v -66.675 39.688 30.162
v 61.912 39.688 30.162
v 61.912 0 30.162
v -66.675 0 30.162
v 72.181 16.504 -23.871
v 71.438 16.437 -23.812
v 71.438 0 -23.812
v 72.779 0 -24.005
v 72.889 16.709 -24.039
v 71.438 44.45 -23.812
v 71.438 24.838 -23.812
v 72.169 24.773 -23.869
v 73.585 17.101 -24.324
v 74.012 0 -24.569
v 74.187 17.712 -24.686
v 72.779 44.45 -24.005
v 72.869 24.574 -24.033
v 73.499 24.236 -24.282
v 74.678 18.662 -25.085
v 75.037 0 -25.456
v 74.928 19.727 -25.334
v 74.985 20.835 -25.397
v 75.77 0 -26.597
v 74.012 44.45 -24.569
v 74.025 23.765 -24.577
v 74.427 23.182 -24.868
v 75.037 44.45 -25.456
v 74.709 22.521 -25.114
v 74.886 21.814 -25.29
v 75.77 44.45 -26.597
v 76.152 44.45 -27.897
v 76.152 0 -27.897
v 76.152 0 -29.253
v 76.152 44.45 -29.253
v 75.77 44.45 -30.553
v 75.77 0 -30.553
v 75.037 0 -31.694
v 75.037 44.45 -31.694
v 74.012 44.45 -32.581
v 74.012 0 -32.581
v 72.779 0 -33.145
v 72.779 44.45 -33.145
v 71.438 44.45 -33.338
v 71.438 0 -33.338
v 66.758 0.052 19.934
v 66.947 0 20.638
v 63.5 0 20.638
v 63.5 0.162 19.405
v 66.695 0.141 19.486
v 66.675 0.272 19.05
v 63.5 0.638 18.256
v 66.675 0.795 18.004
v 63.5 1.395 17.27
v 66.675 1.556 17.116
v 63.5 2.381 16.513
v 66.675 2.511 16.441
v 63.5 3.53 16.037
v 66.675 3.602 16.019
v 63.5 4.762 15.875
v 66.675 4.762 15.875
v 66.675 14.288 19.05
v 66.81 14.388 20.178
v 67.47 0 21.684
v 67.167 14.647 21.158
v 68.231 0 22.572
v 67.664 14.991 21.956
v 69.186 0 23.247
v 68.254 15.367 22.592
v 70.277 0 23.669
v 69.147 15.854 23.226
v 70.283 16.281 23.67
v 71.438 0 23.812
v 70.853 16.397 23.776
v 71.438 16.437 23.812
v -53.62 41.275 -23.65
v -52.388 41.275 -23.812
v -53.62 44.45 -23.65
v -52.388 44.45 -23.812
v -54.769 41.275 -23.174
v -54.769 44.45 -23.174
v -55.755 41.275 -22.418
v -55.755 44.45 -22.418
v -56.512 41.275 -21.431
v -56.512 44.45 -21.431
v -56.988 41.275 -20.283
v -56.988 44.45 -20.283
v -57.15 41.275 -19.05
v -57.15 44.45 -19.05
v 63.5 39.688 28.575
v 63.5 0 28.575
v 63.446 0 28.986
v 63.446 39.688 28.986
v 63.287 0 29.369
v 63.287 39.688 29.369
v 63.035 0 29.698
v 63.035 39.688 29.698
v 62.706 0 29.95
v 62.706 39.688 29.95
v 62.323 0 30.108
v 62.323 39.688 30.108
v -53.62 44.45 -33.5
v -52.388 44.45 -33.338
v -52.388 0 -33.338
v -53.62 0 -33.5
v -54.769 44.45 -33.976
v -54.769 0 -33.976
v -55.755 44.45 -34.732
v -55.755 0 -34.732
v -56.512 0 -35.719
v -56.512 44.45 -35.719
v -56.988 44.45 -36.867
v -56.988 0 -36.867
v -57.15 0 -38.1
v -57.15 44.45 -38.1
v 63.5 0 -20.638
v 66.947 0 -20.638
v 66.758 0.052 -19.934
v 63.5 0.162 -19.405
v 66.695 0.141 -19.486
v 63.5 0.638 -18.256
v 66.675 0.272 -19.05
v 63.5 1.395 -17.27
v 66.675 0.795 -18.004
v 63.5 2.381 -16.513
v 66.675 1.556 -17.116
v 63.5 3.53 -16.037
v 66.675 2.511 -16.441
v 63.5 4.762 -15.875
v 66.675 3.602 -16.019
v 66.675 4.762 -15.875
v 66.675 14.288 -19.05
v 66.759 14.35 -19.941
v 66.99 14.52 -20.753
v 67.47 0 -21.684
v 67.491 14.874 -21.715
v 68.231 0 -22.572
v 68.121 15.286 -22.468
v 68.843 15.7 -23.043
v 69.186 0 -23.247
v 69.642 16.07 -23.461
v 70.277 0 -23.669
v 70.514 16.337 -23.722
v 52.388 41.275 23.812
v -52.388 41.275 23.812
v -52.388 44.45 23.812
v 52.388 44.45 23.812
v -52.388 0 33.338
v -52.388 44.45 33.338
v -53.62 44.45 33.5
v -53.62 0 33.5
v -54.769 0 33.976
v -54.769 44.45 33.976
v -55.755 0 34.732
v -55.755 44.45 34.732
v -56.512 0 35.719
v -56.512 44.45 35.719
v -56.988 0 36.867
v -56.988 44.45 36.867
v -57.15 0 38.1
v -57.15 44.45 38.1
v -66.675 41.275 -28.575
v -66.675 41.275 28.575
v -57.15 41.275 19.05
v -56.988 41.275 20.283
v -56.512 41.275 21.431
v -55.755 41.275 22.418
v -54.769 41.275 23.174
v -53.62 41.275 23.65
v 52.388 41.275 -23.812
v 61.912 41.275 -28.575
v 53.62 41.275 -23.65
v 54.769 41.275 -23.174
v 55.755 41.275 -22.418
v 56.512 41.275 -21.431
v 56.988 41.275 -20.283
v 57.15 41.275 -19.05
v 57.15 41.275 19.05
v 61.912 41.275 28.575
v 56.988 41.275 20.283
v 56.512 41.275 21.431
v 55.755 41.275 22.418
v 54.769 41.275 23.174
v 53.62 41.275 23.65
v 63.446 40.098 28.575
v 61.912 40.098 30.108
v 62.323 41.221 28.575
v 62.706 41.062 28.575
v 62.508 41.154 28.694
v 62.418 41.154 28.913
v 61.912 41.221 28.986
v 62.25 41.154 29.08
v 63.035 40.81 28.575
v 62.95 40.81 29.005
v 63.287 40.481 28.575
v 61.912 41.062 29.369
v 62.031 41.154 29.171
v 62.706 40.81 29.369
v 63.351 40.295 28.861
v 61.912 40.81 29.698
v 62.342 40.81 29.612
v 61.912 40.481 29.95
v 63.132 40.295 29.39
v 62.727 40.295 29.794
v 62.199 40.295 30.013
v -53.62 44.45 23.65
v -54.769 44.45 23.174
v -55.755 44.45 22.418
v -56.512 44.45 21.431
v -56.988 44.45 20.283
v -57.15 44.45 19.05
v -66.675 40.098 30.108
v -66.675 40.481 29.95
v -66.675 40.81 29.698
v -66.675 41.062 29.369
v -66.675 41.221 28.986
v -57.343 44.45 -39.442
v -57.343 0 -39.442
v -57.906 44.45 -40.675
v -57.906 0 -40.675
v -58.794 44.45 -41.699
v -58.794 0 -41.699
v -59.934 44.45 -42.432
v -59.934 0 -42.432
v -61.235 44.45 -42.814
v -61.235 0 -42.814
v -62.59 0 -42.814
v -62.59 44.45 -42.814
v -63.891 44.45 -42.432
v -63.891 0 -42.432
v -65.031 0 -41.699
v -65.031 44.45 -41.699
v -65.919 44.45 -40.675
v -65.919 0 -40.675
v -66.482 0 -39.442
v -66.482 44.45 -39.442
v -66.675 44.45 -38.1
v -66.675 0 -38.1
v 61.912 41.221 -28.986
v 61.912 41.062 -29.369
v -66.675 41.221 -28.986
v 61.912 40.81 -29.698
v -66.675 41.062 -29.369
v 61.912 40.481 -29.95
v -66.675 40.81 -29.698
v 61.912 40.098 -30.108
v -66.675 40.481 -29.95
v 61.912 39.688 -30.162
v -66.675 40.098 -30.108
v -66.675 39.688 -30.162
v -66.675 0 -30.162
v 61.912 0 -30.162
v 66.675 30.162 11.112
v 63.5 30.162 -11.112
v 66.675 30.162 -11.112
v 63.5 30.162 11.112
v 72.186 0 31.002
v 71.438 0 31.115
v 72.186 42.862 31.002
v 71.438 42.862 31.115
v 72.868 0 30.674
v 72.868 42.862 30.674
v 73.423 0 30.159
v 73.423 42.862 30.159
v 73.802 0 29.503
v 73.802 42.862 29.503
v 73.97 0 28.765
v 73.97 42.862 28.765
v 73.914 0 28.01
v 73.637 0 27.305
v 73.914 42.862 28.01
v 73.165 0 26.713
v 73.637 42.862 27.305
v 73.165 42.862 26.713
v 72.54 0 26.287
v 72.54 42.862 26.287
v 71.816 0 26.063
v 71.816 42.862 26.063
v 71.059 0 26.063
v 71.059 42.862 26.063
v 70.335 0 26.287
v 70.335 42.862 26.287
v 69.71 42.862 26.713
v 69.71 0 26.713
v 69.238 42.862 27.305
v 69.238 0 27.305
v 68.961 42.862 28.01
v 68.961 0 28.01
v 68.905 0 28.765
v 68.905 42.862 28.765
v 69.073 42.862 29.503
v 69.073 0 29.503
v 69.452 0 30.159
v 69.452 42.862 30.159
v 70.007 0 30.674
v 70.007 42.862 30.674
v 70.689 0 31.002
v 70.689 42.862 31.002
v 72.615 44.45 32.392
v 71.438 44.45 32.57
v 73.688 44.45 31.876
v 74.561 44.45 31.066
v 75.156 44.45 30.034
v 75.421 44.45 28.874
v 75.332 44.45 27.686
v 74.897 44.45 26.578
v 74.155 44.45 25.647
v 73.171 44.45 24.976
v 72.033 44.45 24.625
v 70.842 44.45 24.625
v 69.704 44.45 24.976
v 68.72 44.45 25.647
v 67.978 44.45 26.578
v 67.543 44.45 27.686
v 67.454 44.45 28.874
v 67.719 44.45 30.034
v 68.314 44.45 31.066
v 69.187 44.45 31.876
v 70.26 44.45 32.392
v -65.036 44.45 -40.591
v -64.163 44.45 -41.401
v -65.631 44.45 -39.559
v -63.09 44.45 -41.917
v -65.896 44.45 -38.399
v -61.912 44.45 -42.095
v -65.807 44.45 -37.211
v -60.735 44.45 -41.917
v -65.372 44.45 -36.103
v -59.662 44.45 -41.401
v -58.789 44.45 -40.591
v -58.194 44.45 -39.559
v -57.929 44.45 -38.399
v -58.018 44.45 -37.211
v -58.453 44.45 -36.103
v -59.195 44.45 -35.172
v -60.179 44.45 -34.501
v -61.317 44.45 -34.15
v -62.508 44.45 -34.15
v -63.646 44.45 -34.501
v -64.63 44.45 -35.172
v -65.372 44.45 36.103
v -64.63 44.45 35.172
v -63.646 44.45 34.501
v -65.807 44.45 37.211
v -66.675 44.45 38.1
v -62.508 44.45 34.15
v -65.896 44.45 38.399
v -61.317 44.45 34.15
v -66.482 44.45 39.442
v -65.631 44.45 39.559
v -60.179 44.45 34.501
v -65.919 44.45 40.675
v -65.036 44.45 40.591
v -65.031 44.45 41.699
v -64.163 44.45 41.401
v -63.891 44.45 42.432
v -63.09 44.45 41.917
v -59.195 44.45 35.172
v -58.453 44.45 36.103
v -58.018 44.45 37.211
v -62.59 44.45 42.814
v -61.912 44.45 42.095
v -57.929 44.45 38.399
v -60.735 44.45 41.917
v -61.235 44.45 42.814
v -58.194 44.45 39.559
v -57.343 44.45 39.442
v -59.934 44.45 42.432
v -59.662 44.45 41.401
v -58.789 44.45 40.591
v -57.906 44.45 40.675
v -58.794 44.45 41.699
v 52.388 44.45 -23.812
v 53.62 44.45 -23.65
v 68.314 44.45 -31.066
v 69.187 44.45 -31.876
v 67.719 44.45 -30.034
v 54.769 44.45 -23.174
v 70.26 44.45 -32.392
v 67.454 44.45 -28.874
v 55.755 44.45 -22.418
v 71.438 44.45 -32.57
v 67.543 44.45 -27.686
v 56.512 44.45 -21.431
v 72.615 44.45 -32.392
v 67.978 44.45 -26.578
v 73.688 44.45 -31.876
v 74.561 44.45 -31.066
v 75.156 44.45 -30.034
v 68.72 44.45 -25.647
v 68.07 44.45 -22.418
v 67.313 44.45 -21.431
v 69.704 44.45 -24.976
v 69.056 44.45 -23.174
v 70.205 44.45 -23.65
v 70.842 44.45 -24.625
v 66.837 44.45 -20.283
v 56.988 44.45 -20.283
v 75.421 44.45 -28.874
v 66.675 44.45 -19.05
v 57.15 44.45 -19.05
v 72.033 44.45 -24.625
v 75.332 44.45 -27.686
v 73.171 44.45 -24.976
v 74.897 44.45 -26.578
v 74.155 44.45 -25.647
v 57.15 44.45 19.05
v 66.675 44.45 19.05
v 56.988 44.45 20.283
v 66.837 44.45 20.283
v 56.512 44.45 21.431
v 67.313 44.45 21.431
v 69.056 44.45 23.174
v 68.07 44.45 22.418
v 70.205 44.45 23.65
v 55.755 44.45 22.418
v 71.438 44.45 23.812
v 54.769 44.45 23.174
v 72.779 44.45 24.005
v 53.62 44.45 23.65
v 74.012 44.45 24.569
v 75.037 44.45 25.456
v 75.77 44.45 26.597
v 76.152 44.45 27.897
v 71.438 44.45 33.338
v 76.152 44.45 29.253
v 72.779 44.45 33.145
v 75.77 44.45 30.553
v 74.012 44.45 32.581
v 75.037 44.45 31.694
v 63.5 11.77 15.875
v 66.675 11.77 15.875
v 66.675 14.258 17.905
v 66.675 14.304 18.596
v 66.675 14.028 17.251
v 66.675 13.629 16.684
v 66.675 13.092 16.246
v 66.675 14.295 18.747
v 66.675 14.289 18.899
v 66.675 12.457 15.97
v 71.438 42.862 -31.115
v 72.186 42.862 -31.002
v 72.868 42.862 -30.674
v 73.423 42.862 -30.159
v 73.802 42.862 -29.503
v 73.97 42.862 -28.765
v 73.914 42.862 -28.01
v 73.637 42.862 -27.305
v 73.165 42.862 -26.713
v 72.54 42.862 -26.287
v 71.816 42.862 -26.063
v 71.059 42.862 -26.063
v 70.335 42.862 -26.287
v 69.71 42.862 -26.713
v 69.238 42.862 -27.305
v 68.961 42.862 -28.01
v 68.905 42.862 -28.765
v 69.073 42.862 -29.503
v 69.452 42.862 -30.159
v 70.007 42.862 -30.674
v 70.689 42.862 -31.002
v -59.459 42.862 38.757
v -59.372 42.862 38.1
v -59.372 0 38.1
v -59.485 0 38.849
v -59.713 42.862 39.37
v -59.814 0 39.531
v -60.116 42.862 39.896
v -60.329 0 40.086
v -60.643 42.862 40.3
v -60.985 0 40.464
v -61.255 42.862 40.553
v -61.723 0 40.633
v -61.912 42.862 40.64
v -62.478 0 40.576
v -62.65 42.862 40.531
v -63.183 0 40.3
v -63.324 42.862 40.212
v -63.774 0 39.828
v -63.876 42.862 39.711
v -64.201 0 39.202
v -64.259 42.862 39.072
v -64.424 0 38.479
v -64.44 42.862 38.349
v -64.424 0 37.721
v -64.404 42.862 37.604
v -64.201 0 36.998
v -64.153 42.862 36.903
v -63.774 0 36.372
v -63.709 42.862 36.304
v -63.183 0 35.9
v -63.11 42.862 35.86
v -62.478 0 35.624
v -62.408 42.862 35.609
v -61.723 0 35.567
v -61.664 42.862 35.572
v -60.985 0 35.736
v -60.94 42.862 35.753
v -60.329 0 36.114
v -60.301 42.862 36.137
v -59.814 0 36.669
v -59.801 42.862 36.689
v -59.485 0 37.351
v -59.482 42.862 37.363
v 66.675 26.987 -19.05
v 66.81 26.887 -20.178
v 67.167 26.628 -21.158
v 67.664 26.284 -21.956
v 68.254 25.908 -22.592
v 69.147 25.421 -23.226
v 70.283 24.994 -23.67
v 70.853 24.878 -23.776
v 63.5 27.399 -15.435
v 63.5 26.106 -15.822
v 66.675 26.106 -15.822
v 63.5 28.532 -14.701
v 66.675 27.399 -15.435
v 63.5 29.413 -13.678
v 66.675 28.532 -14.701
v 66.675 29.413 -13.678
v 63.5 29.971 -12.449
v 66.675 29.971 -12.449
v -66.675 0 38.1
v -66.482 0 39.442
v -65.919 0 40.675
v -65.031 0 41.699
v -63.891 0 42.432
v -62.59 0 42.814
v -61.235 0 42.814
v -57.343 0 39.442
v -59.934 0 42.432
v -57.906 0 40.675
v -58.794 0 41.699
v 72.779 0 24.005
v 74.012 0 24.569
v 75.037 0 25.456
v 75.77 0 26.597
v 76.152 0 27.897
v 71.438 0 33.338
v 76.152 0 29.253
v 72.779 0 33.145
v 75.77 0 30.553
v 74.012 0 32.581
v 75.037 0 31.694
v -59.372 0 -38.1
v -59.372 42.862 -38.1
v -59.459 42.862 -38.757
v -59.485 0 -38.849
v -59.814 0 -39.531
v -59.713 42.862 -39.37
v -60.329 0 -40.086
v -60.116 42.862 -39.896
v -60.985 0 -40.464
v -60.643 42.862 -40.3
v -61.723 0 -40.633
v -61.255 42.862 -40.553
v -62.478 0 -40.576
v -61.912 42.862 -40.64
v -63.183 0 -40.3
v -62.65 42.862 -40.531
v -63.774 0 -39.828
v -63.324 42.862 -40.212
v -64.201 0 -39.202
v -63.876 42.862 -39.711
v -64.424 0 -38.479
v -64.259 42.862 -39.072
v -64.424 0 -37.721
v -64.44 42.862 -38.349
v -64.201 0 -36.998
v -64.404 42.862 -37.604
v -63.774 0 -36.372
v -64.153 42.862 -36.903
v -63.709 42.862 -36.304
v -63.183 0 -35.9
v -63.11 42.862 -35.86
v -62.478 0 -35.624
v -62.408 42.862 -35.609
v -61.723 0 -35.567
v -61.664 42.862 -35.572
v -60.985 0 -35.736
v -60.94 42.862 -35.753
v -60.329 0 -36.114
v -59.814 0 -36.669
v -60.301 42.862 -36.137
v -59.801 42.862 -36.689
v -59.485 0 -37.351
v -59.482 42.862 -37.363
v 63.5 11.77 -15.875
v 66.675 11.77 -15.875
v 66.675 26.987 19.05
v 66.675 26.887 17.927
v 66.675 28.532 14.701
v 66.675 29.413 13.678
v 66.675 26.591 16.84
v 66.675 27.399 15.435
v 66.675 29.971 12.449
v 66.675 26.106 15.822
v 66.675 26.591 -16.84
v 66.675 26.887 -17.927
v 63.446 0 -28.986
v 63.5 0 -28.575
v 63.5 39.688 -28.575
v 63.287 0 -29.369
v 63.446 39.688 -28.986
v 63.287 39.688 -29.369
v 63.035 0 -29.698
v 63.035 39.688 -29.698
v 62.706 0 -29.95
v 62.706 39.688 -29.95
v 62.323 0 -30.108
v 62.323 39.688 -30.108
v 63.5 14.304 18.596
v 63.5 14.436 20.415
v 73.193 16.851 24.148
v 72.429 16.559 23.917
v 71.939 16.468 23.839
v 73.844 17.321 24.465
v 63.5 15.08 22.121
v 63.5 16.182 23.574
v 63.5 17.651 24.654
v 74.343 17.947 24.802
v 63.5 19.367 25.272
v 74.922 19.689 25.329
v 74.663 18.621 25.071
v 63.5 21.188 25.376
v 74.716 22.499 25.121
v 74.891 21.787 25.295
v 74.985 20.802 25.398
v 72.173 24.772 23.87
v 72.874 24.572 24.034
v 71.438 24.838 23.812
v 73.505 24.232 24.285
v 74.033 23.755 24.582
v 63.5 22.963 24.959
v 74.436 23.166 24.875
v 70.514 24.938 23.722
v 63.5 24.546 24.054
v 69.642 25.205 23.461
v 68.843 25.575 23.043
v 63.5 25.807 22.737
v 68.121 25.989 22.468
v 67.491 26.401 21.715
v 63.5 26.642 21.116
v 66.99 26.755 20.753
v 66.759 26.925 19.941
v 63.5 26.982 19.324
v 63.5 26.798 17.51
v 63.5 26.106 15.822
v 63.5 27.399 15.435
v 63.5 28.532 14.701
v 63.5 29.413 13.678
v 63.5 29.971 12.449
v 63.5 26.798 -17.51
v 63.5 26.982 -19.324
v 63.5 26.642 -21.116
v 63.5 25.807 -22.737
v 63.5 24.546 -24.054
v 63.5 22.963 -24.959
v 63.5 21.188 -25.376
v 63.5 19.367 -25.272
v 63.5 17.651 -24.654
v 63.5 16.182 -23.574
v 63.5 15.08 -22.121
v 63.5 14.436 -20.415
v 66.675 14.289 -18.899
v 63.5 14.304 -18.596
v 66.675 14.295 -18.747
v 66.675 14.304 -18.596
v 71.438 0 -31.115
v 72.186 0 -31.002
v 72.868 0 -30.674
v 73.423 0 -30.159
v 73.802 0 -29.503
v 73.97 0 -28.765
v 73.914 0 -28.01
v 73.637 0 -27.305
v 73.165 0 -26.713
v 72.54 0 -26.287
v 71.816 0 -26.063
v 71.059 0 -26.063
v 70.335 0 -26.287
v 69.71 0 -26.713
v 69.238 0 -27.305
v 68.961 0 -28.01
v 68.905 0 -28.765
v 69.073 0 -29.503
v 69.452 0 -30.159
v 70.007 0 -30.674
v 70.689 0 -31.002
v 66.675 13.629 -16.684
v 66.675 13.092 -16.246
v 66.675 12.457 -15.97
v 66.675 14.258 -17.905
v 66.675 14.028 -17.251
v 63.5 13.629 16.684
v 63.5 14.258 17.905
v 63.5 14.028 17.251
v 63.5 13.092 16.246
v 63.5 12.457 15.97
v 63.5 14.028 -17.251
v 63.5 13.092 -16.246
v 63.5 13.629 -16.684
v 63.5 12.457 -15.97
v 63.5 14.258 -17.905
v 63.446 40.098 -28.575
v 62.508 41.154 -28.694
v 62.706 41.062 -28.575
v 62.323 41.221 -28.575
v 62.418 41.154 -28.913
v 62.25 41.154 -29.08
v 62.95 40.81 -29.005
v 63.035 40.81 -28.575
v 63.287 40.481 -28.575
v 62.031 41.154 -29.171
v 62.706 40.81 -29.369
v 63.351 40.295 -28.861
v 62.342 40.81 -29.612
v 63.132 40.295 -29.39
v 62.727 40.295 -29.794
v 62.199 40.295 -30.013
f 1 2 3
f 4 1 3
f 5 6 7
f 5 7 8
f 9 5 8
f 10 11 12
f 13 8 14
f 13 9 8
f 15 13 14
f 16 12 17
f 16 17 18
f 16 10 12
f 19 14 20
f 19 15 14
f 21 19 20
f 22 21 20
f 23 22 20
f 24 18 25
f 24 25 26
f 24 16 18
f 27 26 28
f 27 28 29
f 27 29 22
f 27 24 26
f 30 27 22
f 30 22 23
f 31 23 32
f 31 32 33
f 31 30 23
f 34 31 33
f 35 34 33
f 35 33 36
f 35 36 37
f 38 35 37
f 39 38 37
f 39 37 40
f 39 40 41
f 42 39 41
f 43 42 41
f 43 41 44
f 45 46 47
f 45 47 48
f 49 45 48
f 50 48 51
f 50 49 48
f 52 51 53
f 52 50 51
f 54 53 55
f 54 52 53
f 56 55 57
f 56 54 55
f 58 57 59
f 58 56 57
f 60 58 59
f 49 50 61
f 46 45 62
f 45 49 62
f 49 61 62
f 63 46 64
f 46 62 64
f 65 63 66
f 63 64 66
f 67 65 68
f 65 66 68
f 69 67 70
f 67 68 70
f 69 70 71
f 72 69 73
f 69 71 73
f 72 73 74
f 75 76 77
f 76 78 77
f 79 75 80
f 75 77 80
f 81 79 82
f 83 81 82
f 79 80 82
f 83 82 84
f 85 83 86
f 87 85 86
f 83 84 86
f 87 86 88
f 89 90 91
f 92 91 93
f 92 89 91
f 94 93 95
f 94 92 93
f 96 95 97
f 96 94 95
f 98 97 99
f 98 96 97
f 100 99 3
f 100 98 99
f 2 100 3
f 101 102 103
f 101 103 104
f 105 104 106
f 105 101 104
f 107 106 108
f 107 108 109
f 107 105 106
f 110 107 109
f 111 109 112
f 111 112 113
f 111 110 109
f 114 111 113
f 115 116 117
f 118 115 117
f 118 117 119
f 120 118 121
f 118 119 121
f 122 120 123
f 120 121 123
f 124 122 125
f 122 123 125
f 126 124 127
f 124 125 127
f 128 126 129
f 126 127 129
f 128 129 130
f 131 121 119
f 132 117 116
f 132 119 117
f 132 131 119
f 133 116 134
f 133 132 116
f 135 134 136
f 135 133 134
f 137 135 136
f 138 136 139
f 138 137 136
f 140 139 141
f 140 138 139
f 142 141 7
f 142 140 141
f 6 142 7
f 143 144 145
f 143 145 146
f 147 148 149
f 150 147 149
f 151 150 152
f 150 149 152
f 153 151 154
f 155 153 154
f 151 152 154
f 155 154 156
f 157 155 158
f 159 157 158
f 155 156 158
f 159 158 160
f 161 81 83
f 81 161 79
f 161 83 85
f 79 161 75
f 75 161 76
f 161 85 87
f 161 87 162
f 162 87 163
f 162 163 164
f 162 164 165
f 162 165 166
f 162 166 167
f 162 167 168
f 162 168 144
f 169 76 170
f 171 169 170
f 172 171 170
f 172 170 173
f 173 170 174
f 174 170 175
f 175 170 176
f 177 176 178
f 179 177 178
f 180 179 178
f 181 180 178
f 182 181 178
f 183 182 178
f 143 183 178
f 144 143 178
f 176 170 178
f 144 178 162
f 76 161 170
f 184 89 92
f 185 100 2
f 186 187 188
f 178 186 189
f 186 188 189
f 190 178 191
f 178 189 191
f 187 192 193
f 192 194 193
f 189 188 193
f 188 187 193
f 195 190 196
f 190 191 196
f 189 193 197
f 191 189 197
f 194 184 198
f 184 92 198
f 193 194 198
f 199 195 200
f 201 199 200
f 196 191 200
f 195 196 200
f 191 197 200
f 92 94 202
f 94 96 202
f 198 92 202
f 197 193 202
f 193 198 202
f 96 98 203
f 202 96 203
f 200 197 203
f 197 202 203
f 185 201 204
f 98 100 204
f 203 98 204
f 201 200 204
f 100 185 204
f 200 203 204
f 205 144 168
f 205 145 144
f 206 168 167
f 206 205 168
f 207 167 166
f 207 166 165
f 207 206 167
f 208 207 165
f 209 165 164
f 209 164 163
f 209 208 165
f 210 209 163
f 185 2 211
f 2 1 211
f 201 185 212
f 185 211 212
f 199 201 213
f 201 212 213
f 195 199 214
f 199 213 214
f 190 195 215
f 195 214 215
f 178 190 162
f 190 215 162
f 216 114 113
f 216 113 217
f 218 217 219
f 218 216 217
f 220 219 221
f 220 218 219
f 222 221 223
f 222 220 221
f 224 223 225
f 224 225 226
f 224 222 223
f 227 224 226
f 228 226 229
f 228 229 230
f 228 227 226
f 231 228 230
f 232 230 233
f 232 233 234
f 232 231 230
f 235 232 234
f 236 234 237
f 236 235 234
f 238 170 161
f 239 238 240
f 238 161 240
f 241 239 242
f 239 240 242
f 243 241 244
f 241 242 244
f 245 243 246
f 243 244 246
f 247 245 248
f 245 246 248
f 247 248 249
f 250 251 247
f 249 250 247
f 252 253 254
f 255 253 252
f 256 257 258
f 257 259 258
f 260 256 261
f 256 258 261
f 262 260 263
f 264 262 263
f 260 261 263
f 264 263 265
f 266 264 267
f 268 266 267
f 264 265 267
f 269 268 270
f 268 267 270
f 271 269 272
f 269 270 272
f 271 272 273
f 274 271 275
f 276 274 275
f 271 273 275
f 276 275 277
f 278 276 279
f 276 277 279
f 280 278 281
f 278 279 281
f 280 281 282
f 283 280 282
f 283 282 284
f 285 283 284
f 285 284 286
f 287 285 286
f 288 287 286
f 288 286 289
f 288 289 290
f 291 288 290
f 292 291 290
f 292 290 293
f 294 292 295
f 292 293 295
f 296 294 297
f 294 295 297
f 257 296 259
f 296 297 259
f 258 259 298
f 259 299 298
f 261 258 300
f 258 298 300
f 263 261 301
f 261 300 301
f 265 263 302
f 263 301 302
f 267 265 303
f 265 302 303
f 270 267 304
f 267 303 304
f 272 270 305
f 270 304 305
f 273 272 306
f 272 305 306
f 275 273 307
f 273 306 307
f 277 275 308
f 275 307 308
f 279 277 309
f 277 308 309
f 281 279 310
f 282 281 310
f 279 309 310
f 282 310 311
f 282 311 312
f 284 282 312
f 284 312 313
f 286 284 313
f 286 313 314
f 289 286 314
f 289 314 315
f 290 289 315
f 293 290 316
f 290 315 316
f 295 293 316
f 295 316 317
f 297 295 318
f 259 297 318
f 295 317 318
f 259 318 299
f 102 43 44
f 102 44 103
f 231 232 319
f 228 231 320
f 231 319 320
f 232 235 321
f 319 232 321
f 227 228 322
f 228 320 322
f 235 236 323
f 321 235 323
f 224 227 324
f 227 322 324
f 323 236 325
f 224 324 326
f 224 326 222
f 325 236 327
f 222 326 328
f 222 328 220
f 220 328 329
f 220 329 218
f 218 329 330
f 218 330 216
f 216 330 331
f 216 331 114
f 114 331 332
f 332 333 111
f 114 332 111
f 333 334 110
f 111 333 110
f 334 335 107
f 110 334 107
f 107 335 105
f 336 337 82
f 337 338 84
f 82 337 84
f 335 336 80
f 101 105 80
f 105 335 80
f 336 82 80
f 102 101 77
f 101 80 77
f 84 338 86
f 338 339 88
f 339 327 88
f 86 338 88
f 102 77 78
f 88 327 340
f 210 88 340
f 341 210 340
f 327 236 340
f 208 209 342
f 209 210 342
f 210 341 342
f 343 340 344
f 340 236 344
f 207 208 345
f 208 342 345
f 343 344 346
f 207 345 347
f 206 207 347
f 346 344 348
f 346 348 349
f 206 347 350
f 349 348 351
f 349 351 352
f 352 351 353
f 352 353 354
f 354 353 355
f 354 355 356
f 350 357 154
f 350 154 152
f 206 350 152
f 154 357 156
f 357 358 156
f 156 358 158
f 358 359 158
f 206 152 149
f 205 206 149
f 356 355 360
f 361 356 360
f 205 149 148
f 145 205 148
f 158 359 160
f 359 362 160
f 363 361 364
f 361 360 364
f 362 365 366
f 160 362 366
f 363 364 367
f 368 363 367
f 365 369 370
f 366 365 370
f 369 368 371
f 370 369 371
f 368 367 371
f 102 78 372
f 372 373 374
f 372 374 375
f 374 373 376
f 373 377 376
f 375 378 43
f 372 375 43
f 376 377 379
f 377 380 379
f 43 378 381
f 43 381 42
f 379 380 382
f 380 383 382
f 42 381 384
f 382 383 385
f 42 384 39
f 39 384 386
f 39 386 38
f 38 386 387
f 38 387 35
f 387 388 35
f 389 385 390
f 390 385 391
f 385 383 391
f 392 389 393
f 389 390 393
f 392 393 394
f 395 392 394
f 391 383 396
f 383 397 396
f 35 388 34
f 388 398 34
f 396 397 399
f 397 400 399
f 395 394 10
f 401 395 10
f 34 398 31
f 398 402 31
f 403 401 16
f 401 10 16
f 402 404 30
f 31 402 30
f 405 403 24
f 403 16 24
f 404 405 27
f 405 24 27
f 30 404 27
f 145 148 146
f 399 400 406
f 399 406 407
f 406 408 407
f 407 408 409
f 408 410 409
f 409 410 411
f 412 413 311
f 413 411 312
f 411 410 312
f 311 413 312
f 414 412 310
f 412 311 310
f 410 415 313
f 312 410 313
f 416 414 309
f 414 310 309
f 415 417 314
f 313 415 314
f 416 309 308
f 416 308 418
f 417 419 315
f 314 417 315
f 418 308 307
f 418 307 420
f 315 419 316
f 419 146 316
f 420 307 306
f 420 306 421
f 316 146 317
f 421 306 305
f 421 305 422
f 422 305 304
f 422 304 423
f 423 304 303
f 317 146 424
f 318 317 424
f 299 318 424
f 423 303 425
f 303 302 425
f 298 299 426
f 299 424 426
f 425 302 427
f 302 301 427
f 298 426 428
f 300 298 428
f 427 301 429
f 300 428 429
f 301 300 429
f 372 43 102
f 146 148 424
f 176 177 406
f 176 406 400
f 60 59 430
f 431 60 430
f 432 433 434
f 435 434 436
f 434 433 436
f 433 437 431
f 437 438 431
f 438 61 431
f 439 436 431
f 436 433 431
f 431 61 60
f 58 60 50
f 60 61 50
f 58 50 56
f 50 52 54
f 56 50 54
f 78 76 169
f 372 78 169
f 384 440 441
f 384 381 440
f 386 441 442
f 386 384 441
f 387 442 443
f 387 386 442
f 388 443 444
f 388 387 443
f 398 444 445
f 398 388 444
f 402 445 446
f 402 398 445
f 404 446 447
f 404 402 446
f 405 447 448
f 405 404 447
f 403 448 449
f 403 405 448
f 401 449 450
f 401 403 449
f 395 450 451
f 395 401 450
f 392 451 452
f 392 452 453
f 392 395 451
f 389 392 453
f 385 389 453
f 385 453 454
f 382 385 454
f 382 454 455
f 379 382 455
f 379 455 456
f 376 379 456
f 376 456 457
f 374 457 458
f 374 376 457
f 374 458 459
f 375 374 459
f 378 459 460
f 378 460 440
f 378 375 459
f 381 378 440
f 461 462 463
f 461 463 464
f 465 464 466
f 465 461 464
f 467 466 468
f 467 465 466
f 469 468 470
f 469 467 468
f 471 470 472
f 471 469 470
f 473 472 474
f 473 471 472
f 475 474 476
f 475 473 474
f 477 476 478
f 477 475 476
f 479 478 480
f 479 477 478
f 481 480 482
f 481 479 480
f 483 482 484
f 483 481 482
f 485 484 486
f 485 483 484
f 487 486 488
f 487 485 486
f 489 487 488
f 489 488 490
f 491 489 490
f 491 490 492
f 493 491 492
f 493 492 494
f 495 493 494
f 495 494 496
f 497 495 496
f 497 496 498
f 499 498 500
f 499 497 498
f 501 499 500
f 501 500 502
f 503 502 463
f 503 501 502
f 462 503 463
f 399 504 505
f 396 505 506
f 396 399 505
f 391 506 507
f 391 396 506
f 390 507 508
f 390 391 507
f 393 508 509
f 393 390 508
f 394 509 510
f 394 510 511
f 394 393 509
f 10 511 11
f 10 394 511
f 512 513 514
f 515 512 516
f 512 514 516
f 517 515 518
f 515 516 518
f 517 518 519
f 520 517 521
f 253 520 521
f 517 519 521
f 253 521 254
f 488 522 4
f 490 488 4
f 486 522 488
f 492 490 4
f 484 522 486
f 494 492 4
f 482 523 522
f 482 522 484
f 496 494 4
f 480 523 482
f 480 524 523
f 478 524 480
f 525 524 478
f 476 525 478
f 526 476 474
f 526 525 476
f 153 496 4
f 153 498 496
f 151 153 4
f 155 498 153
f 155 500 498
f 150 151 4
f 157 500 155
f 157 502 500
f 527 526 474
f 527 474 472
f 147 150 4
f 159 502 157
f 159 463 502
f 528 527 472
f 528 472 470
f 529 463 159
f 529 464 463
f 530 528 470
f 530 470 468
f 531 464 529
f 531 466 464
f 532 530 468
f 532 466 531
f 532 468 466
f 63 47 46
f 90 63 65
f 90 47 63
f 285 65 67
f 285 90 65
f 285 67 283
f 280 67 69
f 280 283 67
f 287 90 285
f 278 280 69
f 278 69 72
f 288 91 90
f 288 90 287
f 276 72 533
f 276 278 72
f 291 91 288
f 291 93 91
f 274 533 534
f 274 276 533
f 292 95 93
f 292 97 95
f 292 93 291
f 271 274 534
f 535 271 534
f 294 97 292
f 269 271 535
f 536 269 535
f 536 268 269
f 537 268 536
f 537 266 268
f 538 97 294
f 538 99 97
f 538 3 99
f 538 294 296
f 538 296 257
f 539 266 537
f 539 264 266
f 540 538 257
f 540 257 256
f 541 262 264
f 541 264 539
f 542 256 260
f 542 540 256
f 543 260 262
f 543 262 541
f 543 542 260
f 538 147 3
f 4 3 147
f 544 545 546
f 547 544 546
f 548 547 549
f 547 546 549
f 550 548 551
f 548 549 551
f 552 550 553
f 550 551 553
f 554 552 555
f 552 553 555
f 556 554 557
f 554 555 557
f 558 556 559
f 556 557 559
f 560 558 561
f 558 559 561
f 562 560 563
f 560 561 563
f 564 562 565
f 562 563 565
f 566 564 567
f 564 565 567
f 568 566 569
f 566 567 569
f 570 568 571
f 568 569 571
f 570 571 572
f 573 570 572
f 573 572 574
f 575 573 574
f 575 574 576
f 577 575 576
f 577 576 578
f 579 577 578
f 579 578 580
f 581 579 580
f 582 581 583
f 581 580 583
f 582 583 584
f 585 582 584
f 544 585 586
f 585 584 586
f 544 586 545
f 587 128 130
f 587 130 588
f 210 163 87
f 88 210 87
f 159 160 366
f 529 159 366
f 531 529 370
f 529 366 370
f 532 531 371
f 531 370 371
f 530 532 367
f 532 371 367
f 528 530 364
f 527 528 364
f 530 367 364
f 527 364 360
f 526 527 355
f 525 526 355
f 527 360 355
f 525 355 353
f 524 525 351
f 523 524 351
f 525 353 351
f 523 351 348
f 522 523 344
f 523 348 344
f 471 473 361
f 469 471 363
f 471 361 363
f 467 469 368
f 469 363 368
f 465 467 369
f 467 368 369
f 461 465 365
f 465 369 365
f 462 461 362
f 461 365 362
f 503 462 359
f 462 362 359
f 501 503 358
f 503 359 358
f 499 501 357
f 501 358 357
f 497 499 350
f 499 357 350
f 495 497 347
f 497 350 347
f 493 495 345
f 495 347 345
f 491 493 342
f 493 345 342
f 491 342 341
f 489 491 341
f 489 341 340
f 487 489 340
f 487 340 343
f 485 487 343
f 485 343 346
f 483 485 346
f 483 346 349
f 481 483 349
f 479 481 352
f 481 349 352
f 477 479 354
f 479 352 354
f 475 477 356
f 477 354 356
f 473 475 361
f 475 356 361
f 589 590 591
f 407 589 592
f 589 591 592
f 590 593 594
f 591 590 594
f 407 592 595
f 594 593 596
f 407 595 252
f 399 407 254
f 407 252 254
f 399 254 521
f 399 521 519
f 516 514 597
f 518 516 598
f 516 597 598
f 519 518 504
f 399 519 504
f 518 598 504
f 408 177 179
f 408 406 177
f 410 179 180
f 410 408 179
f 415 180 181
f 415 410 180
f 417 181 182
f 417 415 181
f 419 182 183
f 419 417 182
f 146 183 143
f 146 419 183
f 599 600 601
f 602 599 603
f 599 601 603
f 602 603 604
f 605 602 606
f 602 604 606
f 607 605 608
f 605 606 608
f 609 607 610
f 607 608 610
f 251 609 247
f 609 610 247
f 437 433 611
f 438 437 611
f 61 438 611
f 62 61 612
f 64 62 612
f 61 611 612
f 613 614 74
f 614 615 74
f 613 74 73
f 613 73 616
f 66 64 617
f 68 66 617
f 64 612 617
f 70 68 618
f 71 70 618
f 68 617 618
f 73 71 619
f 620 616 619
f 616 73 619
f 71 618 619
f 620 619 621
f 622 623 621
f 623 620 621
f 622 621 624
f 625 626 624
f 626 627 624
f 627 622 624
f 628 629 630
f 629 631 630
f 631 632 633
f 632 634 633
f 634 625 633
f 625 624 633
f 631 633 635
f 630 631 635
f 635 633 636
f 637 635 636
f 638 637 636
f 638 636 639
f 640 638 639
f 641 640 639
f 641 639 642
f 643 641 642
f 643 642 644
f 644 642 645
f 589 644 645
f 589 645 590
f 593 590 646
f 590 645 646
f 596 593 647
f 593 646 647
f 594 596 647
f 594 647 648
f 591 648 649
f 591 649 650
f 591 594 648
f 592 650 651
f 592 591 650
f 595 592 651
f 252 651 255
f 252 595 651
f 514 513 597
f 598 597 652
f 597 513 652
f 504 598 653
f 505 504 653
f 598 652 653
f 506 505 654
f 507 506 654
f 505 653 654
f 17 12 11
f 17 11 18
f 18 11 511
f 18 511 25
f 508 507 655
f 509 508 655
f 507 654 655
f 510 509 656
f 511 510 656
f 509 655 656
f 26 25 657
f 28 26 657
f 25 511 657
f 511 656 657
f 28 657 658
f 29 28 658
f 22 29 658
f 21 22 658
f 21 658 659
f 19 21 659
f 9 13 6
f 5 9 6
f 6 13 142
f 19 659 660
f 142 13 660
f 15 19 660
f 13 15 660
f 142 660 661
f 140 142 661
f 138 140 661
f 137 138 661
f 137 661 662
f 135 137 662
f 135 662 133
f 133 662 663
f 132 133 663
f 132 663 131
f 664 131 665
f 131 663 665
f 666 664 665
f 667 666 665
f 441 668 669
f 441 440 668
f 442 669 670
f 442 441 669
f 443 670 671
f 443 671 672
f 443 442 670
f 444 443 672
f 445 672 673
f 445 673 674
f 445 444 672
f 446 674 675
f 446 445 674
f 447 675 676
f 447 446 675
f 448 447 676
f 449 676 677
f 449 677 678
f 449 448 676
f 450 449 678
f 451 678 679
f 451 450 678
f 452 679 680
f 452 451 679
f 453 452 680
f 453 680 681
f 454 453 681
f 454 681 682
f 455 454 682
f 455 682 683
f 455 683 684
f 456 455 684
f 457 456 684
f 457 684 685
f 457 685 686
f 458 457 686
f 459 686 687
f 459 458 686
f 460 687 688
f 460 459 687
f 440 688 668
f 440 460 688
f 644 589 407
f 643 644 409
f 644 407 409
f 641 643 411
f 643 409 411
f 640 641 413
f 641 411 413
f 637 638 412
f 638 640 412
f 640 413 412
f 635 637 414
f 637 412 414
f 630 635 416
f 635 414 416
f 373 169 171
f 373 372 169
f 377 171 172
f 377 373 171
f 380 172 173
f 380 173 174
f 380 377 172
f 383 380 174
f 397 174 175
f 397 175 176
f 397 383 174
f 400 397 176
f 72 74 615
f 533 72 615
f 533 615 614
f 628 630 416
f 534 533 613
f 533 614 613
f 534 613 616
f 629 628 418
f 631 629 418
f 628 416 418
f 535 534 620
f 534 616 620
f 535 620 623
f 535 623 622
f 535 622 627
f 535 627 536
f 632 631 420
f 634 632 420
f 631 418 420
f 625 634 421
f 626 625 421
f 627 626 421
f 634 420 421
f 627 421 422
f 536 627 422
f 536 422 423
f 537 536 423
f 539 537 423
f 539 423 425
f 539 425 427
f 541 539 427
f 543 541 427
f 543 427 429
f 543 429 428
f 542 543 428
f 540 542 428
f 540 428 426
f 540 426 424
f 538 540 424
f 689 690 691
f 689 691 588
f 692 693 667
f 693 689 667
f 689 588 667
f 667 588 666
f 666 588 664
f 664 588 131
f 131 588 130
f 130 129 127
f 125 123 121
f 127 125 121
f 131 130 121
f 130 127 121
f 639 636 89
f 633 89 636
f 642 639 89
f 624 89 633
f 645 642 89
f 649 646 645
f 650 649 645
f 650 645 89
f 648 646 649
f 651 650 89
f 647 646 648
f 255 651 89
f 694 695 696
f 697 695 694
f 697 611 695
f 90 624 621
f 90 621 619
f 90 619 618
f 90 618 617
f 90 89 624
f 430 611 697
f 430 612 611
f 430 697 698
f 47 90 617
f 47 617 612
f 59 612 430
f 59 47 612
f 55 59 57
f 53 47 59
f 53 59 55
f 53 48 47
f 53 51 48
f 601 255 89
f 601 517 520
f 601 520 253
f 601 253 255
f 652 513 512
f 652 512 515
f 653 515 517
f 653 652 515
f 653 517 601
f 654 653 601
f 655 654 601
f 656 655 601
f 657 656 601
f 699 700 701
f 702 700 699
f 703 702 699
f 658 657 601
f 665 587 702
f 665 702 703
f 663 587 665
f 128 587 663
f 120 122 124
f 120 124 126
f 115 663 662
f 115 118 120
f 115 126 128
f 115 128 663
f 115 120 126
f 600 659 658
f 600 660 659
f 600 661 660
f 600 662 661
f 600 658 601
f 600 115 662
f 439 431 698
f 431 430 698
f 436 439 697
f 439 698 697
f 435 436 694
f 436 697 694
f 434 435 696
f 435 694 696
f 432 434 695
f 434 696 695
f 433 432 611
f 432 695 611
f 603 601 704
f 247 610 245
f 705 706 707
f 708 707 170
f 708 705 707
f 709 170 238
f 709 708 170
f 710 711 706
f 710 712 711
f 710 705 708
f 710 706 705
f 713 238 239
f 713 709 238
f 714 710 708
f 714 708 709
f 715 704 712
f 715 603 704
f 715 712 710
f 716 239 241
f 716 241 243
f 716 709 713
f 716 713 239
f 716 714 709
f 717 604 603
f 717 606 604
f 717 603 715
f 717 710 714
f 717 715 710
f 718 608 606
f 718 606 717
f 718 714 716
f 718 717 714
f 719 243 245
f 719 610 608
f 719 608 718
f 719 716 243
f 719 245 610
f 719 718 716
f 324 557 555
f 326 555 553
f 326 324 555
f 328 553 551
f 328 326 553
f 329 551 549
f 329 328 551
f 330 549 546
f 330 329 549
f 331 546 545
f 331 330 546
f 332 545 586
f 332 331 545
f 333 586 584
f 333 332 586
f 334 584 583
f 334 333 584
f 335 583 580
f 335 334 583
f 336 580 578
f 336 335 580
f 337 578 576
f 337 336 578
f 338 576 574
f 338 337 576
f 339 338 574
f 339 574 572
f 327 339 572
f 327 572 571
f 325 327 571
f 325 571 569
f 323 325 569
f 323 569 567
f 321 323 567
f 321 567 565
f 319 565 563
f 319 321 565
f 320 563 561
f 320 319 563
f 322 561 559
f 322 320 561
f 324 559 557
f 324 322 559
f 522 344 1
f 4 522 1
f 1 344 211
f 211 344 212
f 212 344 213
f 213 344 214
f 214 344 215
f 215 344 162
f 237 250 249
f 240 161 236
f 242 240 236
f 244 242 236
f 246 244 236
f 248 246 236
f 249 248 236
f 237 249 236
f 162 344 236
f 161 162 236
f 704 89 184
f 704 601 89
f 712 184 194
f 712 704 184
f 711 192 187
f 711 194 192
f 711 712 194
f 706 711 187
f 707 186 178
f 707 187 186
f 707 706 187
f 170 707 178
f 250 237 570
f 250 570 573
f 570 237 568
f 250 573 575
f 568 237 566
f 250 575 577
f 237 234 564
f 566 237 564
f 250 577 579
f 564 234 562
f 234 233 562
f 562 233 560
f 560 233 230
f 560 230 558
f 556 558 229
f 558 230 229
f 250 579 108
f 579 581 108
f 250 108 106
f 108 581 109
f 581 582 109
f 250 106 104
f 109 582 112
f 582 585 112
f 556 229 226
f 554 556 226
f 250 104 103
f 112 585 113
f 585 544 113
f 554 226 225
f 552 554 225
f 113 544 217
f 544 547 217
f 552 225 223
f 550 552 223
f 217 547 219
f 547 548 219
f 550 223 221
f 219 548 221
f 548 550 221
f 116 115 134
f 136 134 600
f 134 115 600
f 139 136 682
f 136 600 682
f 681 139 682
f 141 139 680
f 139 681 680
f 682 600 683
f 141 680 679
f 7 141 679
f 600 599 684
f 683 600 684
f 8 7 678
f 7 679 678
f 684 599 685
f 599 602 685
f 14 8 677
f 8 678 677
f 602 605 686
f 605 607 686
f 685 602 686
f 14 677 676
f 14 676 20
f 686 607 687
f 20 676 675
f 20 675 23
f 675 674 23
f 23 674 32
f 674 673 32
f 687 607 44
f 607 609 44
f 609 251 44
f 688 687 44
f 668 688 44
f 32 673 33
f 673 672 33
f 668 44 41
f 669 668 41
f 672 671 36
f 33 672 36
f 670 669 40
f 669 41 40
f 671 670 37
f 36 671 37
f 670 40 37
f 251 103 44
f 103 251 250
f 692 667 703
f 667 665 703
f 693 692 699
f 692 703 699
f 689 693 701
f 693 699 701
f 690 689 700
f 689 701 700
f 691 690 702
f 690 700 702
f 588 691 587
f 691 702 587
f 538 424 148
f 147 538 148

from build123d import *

# Parameters (mm, degrees)
SKETCH1_W           = 133.35
SKETCH1_H           = 66.675
SKETCH1_W_2         = 127
SKETCH1_H_2         = 60.325
BOSS_EXTRUDE1_DEPTH = 41.275
SKETCH2_W           = 31.75
SKETCH2_H           = 60.325
CUT_EXTRUDE1_DEPTH  = 134.35
SKETCH3_W           = 133.35
SKETCH3_H           = 66.675
SKETCH3_W_2         = 114.3
SKETCH3_H_2         = 47.625
BOSS_EXTRUDE2_DEPTH = 3.175
BOSS_EXTRUDE3_DEPTH = 44.45
SKETCH6_R           = 2.54
BOSS_EXTRUDE4_DEPTH = 44.45
CUT_EXTRUDE2_DEPTH  = 4.175
FILLET1_R           = 1.5875
FILLET2_R           = 4.7625
SKETCH9_R           = 6.35
CUT_EXTRUDE4_DEPTH  = 13.7
FILLET3_R           = 2.54


with BuildPart() as part:
    # Sketch1 → Boss-Extrude1 (new body)
    with BuildSketch(Plane(origin=(0, 0, 0), x_dir=(1, 0, 0), z_dir=(0, 1, 0))):
        Rectangle(SKETCH1_W, SKETCH1_H)
        Rectangle(SKETCH1_W_2, SKETCH1_H_2, mode=Mode.SUBTRACT)
    extrude(amount=BOSS_EXTRUDE1_DEPTH)

    # Sketch2 → Cut-Extrude1 (cut, through all)
    with BuildSketch(Plane.ZY.offset(66.675)):
        Rectangle(SKETCH2_W, SKETCH2_H)
    extrude(amount=-CUT_EXTRUDE1_DEPTH, mode=Mode.SUBTRACT)

    # Sketch3 → Boss-Extrude2 (add)
    with BuildSketch(Plane(origin=(0, 41.275, 0), x_dir=(1, 0, 0), z_dir=(0, 1, 0))):
        Rectangle(SKETCH3_W, SKETCH3_H)
        Rectangle(SKETCH3_W_2, SKETCH3_H_2, mode=Mode.SUBTRACT)
    extrude(amount=BOSS_EXTRUDE2_DEPTH)

    # Sketch4 → Boss-Extrude3 (add)
    with BuildSketch(Plane(origin=(0, 44.45, 0), x_dir=(1, 0, 0), z_dir=(0, 1, 0))):
        with BuildLine():
            Line((71.4375, 33.3375), (66.675, 33.3375))
            Line((66.675, 33.3375), (66.675, 19.05))
            ThreePointArc((66.675, 19.05), (68.069903955, 22.417596045), (71.4375, 23.8125))
            ThreePointArc((71.4375, 23.8125), (76.2, 28.575), (71.4375, 33.3375))
        make_face()
    boss_extrude3 = extrude(amount=-BOSS_EXTRUDE3_DEPTH)

    # Sketch5 → Cut-Revolve1 (revolve, cut)
    with BuildSketch(Plane.YZ.offset(71.4375)):
        Polygon((0, -31.115), (42.8625, -31.115), (44.45, -32.569675739), (44.45, -28.575), (0, -28.575), align=None)
    cut_revolve1 = revolve(axis=Axis((71.4375, 44.45, -28.575), (0, -1, 0)), mode=Mode.SUBTRACT)

    # Sketch6 → Boss-Extrude4 (add)
    with BuildSketch(Plane(origin=(0, 44.45, 0), x_dir=(1, 0, 0), z_dir=(0, 1, 0))):
        with BuildLine():
            Line((-66.675, 38.1), (-66.675, 33.3375))
            Line((-66.675, 33.3375), (-52.3875, 33.3375))
            ThreePointArc((-52.3875, 33.3375), (-55.755096045, 34.732403955), (-57.15, 38.1))
            ThreePointArc((-57.15, 38.1), (-61.9125, 42.8625), (-66.675, 38.1))
        make_face()
        with Locations((-61.9125, 38.1)):
            Circle(SKETCH6_R, mode=Mode.SUBTRACT)
    boss_extrude4 = extrude(amount=-BOSS_EXTRUDE4_DEPTH)

    # Sketch7 → Cut-Revolve2 (revolve, cut)
    with BuildSketch(Plane(origin=(-61.9125, 0, 0), x_dir=(0, 1, 0), z_dir=(-1, 0, 0))):
        Polygon((42.8625, 40.64), (44.45, 42.094675739), (44.45, 38.1), (42.8625, 38.1), align=None)
    cut_revolve2 = revolve(axis=Axis((-61.9125, 42.8625, -38.1), (0, -1, 0)), mode=Mode.SUBTRACT)

    # Mirror1: Boss-Extrude3, Cut-Revolve1, Boss-Extrude4, Cut-Revolve2 across plane
    add(boss_extrude3.mirror(Plane.XY))
    add(cut_revolve1.mirror(Plane.XY), mode=Mode.SUBTRACT)
    add(boss_extrude4.mirror(Plane.XY))
    add(cut_revolve2.mirror(Plane.XY), mode=Mode.SUBTRACT)

    # Sketch8 → Cut-Extrude2 (cut, through all)
    with BuildSketch(Plane(origin=(-63.5, 0, 0), x_dir=(0, 0, -1), z_dir=(1, 0, 0))):
        Polygon((-15.875, 0), (-15.875, 30.1625), (15.875, 30.1625), (15.875, 0), (30.1625, 0), (30.1625, 41.275), (-30.1625, 41.275), (-30.1625, 0), align=None)
    extrude(amount=-CUT_EXTRUDE2_DEPTH, mode=Mode.SUBTRACT)

    # Fillet1
    fillet1_edges = [part.edges().sort_by_distance(p)[0] for p in [
        (63.5, 20.6375, 30.1625),
        (63.5, 20.6375, -30.1625),
        (63.5, 41.275, 0),
        (-1.5875, 41.275, -30.1625),
        (-1.5875, 41.275, 30.1625),
    ]]
    fillet(fillet1_edges, radius=FILLET1_R)

    # Fillet2
    fillet2_edges = [part.edges().sort_by_distance(p)[0] for p in [
        (65.0875, 0, 15.875),
        (65.0875, 30.1625, 15.875),
        (65.0875, 0, -15.875),
        (65.0875, 30.1625, -15.875),
        (-57.15, 42.8625, 23.8125),
        (57.15, 42.8625, 23.8125),
        (57.15, 42.8625, -23.8125),
        (-57.15, 42.8625, -23.8125),
    ]]
    fillet(fillet2_edges, radius=FILLET2_R)

    # Sketch9 → Cut-Extrude4 (cut, through all)
    with BuildSketch(Plane.ZY.offset(-63.5)):
        with Locations((19.05, 20.6375)):
            Circle(SKETCH9_R)
        with Locations((-19.05, 20.6375)):
            Circle(SKETCH9_R)
    extrude(amount=-CUT_EXTRUDE4_DEPTH, mode=Mode.SUBTRACT)

    # Fillet3
    fillet3_edges = [part.edges().sort_by_distance(p)[0] for p in [
        (65.0875, 15.138238686, 15.875),
        (65.0875, 15.138238686, -15.875),
    ]]
    fillet(fillet3_edges, radius=FILLET3_R)


solid = part.part
